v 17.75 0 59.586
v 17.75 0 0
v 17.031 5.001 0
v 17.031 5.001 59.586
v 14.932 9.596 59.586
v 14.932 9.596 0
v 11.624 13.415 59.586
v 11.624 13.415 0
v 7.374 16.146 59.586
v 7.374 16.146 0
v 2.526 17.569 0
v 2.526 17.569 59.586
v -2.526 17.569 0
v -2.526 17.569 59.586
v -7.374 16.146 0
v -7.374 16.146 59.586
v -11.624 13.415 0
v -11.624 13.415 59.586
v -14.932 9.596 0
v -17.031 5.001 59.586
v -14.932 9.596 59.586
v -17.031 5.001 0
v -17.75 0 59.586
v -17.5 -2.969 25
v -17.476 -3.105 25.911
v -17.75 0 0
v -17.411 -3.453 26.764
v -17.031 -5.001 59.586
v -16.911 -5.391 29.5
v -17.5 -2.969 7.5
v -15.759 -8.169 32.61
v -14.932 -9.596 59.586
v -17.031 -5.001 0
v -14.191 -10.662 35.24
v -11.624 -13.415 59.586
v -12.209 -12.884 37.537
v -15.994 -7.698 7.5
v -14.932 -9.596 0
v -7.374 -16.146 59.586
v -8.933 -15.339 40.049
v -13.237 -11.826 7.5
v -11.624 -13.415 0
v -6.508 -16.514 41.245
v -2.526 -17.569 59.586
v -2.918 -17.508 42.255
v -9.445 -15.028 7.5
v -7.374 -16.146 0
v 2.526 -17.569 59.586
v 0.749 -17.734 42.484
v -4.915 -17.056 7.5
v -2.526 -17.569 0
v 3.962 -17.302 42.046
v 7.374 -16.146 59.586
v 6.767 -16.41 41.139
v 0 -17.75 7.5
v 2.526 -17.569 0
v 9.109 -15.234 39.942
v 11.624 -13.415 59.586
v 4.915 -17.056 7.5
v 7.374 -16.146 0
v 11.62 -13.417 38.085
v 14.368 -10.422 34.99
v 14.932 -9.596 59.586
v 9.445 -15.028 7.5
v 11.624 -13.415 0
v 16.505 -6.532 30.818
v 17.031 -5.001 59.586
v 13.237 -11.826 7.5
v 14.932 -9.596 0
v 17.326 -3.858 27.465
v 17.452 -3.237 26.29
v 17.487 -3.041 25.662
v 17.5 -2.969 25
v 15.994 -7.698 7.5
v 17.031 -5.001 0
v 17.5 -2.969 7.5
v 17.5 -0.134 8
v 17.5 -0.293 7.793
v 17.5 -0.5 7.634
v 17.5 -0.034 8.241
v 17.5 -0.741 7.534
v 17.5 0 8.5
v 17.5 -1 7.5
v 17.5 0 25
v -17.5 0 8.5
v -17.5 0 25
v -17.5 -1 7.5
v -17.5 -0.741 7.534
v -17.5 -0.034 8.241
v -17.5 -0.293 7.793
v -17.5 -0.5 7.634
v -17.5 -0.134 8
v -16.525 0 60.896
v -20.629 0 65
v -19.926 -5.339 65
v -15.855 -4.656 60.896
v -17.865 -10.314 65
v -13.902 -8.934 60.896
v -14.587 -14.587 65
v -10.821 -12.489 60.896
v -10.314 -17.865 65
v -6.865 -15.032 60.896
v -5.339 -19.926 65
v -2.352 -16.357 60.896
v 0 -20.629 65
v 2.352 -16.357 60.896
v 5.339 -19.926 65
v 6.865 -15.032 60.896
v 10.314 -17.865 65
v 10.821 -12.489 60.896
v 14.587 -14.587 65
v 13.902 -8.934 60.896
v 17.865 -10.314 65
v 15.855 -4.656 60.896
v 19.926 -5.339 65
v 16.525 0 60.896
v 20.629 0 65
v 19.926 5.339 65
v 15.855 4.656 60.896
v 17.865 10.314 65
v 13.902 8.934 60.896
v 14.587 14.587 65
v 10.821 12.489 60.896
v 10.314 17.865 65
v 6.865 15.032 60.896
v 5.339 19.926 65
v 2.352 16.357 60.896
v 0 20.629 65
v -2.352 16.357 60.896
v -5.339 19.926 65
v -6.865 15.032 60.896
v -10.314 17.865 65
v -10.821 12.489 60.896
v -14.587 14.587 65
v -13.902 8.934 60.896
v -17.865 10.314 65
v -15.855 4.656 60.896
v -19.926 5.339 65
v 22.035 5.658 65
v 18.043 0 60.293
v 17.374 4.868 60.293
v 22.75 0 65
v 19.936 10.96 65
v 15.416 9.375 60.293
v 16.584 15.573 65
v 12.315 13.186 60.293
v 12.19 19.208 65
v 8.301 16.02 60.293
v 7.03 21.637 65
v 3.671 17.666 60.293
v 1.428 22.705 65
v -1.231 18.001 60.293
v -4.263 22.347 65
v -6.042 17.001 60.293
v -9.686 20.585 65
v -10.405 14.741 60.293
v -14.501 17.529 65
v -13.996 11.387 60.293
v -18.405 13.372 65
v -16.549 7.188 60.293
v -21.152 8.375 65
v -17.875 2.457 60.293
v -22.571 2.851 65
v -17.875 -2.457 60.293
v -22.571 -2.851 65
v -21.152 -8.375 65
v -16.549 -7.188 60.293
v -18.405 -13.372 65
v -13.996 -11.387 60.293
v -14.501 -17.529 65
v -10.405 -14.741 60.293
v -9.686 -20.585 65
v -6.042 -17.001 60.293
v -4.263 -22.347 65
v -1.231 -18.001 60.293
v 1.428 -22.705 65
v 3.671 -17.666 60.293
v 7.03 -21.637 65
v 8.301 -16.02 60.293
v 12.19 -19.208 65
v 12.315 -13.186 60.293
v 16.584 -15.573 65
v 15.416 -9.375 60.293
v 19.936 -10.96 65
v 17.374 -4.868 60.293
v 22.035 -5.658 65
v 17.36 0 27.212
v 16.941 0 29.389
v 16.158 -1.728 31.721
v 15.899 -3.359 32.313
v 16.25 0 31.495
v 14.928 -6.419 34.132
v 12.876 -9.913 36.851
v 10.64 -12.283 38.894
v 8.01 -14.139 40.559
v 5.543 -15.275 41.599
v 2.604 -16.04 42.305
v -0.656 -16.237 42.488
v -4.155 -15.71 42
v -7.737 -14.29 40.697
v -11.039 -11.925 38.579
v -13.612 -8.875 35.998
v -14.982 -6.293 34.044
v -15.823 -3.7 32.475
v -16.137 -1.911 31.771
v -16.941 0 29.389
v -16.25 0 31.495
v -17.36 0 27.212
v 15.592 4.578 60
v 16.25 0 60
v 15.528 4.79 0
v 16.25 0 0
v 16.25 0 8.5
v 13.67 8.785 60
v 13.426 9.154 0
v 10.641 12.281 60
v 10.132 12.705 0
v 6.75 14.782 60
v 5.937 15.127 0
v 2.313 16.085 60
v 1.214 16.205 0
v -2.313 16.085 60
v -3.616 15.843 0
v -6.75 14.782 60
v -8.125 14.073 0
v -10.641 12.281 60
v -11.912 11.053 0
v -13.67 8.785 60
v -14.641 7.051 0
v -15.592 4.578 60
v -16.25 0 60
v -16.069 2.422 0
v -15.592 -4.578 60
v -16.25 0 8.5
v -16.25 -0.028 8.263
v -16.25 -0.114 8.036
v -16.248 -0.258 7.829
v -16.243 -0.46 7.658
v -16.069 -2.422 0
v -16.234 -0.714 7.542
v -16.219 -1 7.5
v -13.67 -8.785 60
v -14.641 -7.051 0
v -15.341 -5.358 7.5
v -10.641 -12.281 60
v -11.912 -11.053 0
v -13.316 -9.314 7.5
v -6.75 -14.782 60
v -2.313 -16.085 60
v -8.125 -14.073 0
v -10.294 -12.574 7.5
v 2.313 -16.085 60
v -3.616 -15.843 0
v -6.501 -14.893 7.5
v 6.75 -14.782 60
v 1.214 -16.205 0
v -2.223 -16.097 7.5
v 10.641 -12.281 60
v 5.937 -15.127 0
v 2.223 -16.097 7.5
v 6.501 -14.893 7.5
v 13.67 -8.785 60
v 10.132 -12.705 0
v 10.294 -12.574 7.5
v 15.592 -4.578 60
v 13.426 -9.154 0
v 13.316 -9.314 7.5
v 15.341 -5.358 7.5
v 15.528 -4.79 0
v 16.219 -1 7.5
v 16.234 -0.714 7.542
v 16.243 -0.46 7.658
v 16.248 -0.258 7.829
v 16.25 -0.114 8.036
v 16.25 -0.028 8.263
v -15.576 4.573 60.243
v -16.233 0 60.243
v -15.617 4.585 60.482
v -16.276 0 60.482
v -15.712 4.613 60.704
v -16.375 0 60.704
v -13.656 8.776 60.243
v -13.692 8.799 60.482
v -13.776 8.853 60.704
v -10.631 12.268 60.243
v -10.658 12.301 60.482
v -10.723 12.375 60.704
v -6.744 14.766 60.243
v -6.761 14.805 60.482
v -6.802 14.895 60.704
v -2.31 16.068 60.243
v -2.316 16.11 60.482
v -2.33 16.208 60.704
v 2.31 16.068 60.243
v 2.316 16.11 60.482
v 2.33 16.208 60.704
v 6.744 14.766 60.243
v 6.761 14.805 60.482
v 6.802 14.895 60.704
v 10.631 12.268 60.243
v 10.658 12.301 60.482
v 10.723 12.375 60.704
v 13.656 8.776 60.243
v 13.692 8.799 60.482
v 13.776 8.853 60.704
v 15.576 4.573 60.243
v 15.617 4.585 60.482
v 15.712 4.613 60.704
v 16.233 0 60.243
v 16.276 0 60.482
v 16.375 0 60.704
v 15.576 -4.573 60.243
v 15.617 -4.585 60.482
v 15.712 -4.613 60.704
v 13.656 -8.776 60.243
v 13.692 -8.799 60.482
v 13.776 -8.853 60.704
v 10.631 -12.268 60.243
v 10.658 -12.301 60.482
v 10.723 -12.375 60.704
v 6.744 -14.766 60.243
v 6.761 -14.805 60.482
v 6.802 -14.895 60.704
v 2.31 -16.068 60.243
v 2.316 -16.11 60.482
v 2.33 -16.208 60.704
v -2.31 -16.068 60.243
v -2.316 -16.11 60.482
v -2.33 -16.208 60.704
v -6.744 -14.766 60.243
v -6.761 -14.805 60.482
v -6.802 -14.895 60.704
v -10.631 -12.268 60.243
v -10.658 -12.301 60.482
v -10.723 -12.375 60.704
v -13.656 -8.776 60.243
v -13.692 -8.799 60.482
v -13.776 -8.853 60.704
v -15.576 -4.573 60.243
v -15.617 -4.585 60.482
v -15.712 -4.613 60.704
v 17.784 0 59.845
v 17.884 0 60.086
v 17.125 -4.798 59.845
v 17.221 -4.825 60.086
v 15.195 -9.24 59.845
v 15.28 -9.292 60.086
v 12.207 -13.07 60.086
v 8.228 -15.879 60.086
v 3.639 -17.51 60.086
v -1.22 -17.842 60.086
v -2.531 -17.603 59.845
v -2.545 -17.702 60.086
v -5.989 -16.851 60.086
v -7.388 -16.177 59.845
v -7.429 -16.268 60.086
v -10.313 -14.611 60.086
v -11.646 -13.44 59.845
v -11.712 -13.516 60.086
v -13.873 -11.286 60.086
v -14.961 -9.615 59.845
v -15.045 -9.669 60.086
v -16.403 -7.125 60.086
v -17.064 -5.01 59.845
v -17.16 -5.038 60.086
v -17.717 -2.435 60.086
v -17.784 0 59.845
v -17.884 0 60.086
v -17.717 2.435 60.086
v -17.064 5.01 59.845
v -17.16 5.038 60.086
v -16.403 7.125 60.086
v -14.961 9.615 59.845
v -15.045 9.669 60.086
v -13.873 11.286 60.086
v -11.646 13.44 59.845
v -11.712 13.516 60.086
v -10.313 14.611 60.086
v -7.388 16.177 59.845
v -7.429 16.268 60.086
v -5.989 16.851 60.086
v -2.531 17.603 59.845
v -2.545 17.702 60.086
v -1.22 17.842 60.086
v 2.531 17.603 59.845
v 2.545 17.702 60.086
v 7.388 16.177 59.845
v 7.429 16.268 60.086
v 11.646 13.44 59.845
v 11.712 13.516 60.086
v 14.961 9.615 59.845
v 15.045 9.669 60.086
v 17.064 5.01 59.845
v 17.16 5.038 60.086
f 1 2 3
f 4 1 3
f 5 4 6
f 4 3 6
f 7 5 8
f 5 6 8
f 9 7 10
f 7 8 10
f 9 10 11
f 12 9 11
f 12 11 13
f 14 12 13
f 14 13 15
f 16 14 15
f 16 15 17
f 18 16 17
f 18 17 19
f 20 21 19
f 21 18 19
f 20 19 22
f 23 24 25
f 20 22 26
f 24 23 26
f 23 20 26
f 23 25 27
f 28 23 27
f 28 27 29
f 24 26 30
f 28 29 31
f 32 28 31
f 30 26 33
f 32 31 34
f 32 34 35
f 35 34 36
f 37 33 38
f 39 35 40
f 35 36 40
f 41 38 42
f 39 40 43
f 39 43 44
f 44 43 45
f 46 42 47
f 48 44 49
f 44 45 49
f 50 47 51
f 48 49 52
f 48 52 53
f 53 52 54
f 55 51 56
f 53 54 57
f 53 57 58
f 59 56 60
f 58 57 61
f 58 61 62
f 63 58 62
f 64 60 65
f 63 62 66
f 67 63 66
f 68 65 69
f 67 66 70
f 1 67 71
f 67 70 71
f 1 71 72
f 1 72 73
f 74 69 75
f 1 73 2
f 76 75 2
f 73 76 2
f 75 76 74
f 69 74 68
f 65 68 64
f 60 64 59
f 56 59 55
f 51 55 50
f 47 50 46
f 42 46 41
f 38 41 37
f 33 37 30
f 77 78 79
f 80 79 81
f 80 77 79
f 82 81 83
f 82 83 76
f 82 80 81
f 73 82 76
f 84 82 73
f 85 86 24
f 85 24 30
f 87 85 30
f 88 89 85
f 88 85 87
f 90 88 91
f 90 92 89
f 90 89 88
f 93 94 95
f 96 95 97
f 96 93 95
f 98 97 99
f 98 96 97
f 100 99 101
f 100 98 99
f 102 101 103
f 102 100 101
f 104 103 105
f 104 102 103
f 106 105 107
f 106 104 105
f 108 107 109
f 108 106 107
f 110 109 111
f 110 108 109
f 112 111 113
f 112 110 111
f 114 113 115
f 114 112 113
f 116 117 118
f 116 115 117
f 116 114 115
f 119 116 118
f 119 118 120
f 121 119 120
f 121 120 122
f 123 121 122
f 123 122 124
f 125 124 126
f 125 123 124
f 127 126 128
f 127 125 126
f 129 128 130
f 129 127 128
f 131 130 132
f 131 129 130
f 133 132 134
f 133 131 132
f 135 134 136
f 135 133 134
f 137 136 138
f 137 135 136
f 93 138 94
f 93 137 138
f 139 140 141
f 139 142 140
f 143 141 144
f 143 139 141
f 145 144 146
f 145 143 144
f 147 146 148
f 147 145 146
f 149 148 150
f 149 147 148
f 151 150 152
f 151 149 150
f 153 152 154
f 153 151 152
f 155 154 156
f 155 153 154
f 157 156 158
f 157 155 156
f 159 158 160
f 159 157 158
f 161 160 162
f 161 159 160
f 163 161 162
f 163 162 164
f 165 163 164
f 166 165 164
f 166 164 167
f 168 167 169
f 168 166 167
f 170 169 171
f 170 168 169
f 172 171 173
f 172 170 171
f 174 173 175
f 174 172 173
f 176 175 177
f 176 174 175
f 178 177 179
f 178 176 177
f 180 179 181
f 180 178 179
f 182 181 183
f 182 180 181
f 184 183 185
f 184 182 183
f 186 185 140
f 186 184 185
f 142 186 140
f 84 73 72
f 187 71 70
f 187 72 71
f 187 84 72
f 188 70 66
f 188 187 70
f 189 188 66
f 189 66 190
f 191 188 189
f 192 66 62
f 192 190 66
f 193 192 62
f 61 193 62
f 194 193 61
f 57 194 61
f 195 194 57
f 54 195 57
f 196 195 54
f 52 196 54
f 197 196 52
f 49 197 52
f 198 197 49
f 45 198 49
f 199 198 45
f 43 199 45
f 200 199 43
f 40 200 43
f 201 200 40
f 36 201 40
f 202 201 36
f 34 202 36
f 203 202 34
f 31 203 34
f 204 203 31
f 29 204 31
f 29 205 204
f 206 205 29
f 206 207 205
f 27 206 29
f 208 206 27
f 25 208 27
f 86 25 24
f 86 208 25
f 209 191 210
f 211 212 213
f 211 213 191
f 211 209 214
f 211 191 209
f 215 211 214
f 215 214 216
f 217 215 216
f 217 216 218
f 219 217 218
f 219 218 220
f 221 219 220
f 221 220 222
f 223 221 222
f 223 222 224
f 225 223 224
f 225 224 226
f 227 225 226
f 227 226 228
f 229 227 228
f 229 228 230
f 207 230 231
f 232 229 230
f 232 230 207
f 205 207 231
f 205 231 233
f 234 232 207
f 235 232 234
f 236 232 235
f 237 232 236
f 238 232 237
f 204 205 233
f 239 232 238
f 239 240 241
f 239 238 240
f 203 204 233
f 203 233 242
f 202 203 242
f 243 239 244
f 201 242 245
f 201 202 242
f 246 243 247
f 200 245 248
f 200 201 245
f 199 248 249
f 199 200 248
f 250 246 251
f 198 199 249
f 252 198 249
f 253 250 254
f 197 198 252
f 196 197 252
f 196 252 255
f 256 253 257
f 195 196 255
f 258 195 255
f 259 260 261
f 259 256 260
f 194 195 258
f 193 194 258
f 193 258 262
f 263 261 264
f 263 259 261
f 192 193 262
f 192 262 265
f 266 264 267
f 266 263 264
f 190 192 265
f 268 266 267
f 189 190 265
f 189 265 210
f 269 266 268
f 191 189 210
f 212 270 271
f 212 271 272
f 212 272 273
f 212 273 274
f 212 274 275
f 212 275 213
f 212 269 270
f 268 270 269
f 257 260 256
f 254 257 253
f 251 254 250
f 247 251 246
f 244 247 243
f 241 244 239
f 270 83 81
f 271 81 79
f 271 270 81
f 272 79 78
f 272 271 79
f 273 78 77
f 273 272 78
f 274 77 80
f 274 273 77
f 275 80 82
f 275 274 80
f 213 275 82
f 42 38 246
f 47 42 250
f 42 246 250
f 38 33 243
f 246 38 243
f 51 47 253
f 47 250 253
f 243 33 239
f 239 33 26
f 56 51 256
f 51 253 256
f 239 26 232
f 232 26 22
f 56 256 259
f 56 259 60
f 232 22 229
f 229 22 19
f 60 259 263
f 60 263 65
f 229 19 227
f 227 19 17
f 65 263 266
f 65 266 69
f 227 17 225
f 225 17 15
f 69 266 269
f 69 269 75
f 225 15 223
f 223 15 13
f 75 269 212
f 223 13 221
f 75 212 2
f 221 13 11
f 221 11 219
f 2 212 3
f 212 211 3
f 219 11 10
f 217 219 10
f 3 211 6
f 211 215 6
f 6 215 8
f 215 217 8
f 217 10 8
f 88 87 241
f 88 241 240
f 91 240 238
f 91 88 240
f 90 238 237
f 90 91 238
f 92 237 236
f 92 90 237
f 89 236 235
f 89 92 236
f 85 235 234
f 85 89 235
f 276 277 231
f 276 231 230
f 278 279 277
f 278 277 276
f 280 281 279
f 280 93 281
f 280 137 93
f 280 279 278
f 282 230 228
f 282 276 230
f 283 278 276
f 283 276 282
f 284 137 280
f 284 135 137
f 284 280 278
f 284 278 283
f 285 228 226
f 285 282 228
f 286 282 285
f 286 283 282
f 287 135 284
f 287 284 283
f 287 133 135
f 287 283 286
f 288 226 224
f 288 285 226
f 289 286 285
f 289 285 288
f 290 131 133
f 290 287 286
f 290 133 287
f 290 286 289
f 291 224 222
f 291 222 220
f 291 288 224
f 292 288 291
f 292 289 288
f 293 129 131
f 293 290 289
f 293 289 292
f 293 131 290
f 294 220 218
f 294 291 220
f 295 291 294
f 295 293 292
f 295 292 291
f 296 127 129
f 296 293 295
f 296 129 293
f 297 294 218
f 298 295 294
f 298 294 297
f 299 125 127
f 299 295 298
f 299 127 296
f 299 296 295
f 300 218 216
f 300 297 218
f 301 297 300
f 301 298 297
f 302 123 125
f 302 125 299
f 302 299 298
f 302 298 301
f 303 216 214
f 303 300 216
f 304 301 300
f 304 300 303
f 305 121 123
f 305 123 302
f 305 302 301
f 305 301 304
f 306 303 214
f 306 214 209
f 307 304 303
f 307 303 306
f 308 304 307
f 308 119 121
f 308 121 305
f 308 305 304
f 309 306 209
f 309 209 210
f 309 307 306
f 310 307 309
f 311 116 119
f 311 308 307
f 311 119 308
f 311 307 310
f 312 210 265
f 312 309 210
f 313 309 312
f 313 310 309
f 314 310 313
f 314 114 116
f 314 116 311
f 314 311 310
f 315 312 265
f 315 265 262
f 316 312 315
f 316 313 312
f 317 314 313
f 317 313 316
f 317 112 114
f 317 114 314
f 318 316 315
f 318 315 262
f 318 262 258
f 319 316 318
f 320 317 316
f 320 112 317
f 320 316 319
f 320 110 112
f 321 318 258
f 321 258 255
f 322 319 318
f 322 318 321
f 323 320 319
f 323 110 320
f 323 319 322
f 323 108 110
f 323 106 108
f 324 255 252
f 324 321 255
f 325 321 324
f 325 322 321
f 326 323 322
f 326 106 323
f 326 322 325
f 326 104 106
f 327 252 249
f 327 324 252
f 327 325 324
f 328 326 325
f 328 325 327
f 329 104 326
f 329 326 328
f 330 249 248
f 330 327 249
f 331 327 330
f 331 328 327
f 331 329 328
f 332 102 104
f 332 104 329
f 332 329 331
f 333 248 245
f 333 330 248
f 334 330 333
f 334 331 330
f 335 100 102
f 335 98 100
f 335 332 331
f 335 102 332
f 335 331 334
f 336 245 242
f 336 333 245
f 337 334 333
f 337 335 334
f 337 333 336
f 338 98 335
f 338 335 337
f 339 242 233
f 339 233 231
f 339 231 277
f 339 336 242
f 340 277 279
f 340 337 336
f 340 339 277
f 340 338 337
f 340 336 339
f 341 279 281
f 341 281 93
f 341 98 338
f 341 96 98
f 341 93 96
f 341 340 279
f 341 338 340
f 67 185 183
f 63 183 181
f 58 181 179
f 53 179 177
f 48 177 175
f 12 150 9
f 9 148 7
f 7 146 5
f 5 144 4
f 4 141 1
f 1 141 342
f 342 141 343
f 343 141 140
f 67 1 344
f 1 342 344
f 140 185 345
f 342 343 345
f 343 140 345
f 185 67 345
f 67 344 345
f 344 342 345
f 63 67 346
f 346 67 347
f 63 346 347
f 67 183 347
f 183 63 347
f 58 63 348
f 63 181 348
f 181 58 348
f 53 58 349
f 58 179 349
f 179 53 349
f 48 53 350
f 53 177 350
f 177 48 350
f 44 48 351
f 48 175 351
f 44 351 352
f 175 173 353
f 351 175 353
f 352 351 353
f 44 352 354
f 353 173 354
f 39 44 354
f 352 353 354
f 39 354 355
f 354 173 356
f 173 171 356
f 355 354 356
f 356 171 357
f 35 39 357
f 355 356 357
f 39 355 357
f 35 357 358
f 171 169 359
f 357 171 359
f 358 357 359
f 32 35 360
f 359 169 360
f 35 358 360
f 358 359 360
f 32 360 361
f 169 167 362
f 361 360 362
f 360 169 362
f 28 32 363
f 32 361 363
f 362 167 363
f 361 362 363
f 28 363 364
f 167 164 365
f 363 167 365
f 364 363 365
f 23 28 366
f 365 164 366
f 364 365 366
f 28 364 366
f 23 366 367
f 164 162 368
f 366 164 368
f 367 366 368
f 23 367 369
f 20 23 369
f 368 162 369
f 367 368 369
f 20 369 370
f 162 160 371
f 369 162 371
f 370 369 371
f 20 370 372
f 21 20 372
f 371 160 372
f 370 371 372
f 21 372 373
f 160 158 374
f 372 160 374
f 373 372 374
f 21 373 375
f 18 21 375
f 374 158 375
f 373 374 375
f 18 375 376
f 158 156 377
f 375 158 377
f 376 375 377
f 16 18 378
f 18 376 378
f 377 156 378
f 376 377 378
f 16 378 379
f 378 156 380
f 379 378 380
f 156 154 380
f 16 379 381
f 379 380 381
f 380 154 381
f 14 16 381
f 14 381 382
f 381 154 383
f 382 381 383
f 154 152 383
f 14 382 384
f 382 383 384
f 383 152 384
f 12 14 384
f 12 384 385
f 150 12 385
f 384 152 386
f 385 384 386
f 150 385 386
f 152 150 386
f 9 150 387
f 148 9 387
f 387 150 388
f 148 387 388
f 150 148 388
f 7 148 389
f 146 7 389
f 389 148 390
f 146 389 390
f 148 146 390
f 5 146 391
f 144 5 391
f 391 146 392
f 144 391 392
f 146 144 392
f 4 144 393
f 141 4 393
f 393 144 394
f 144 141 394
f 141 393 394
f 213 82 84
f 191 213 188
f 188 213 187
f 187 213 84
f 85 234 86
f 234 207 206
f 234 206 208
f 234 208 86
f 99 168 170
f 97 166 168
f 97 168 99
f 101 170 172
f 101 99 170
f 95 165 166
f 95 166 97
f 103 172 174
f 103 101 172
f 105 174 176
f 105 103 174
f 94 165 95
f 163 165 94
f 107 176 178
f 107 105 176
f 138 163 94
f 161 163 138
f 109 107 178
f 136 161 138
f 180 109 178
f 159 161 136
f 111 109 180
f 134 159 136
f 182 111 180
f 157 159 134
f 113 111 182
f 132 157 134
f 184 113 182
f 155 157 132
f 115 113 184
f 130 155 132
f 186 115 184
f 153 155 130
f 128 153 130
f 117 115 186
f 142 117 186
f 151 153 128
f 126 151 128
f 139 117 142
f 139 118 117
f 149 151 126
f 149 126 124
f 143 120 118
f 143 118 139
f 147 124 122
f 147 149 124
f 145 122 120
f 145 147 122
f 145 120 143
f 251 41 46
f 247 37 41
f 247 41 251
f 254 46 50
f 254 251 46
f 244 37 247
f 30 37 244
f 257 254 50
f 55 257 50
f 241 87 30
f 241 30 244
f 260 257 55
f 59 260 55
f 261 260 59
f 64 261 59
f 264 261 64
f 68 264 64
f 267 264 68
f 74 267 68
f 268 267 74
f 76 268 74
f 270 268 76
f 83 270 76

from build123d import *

# Parameters (mm, degrees)
SCHIZZO1_R                   = 17.75
SCHIZZO1_R_2                 = 16.25
ESTRUSIONE_ESTRUSIONE1_DEPTH = 170
TAGLIO_ESTRUSIONE1_DEPTH     = 170
TAGLIO_ESTRUSIONE2_START     = -60
SCHIZZO4_R                   = 41.734641341
TAGLIO_ESTRUSIONE2_DEPTH     = 112.843315381
SCHIZZO5_R                   = 17.75
SCHIZZO6_R                   = 22.75
RACCORDO1_R                  = 1


with BuildPart() as part:
    # Schizzo1 → Estrusione-Estrusione1 (new body)
    with BuildSketch(Plane.XY):
        Circle(SCHIZZO1_R)
        Circle(SCHIZZO1_R_2, mode=Mode.SUBTRACT)
    extrude(amount=ESTRUSIONE_ESTRUSIONE1_DEPTH)

    # Schizzo2 → Taglio-Estrusione1 (cut)
    with BuildSketch(Plane(origin=(0, 0, 0), x_dir=(1, 0, 0), z_dir=(0, 1, 0))):
        with BuildLine():
            Line((-17.5, -25), (-17.5, -7.5))
            Line((-17.5, -7.5), (17.5, -7.5))
            Line((17.5, -7.5), (17.5, -25))
            ThreePointArc((17.5, -25), (0, -42.5), (-17.5, -25))
        make_face()
    extrude(amount=-TAGLIO_ESTRUSIONE1_DEPTH, mode=Mode.SUBTRACT)

    # Schizzo4 → Taglio-Estrusione2 (cut, through all)
    with BuildSketch(Plane(origin=(0, 0, 0), x_dir=(-1, 0, 0), z_dir=(0, 0, -1)).offset(TAGLIO_ESTRUSIONE2_START)):
        Circle(SCHIZZO4_R)
    extrude(amount=-TAGLIO_ESTRUSIONE2_DEPTH, mode=Mode.SUBTRACT)

    # Schizzo5 → Loft2 section 0
    with BuildSketch(Plane.XY.offset(60)):
        Circle(SCHIZZO5_R)
    # Schizzo6 → Loft2 section 1
    with BuildSketch(Plane.XY.offset(65)):
        Circle(SCHIZZO6_R)
    loft()

    # Schizzo9 → Taglia-Rivoluzione1 (revolve, cut)
    with BuildSketch(Plane(origin=(0, 0, 0), x_dir=(1, 0, 0), z_dir=(0, 1, 0)), mode=Mode.PRIVATE) as taglia_rivoluzione1_sk:
        Polygon((0, -53.809990156), (0, -67.47386211), (23.102541766, -67.47386211), (9.438669813, -53.809990156), align=None)
    revolve(taglia_rivoluzione1_sk.sketch.rotate(Axis((0, 0, 53.809990156), (0, 0, 1)), 180), axis=Axis((0, 0, 53.809990156), (0, 0, 1)), mode=Mode.SUBTRACT)

    # Raccordo1
    # the kernel refuses this fillet: 1 mm, written as the material it adds along each edge
    with BuildSketch(Plane(origin=(13.75, 0, 7.5), x_dir=(0, -1, 0), z_dir=(1, 0, 0))) as raccordo1_piece_1_section:
        with BuildLine():
            CenterArc((RACCORDO1_R, -RACCORDO1_R), RACCORDO1_R, 90, 90)
            Line((0, -RACCORDO1_R), (0, 0))
            Line((0, 0), (RACCORDO1_R, 0))
        make_face()
    raccordo1_piece_1 = extrude(amount=3.75, mode=Mode.PRIVATE)
    raccordo1_piece_1 = raccordo1_piece_1 - Plane(origin=(0, 0, 7.5), x_dir=(1, 0, 0), z_dir=(0, 0, -1)) * Cylinder(16.25, 12, mode=Mode.PRIVATE)
    add(raccordo1_piece_1)
    with BuildSketch(Plane(origin=(-17.5, 0, 7.5), x_dir=(0, -1, 0), z_dir=(1, 0, 0))) as raccordo1_piece_2_section:
        with BuildLine():
            CenterArc((RACCORDO1_R, -RACCORDO1_R), RACCORDO1_R, 90, 90)
            Line((0, -RACCORDO1_R), (0, 0))
            Line((0, 0), (RACCORDO1_R, 0))
        make_face()
    raccordo1_piece_2 = extrude(amount=3.75, mode=Mode.PRIVATE)
    raccordo1_piece_2 = raccordo1_piece_2 - Plane(origin=(0, 0, 7.5), x_dir=(1, 0, 0), z_dir=(0, 0, -1)) * Cylinder(16.25, 12, mode=Mode.PRIVATE)
    add(raccordo1_piece_2)
    with BuildSketch(Plane(origin=(0, 0, 60), x_dir=(1, 0, 0), z_dir=(0, 1, 0))) as raccordo1_piece_3:
        with BuildLine():
            CenterArc((17.75 + RACCORDO1_R, RACCORDO1_R * 0.414213562373), RACCORDO1_R, 180, 45)
            Line((17.75 + RACCORDO1_R * 0.292893218813, -RACCORDO1_R * 0.292893218813), (17.75, 0))
            Line((17.75, 0), (17.75, RACCORDO1_R * 0.414213562373))
        make_face()
    revolve(axis=Axis((0, 0, 60), (0, 0, -1)))
    # the kernel refuses this fillet: 1 mm, written as the material it takes off along each edge
    with BuildSketch(Plane(origin=(0, 0, 60), x_dir=(-1, 0, 0), z_dir=(0, -1, 0))) as raccordo1_2_piece_1:
        with BuildLine():
            CenterArc((17.231963548, -0.18907033), RACCORDO1_R, 169.101465323, 55.898534677)
            Line((16.524856767, -0.896177111), (15.628679656, 0))
            Line((15.628679656, 0), (16.25, 0))
        make_face()
    revolve(axis=Axis((0, 0, 60), (0, 0, -1)), mode=Mode.SUBTRACT)


solid = part.part
